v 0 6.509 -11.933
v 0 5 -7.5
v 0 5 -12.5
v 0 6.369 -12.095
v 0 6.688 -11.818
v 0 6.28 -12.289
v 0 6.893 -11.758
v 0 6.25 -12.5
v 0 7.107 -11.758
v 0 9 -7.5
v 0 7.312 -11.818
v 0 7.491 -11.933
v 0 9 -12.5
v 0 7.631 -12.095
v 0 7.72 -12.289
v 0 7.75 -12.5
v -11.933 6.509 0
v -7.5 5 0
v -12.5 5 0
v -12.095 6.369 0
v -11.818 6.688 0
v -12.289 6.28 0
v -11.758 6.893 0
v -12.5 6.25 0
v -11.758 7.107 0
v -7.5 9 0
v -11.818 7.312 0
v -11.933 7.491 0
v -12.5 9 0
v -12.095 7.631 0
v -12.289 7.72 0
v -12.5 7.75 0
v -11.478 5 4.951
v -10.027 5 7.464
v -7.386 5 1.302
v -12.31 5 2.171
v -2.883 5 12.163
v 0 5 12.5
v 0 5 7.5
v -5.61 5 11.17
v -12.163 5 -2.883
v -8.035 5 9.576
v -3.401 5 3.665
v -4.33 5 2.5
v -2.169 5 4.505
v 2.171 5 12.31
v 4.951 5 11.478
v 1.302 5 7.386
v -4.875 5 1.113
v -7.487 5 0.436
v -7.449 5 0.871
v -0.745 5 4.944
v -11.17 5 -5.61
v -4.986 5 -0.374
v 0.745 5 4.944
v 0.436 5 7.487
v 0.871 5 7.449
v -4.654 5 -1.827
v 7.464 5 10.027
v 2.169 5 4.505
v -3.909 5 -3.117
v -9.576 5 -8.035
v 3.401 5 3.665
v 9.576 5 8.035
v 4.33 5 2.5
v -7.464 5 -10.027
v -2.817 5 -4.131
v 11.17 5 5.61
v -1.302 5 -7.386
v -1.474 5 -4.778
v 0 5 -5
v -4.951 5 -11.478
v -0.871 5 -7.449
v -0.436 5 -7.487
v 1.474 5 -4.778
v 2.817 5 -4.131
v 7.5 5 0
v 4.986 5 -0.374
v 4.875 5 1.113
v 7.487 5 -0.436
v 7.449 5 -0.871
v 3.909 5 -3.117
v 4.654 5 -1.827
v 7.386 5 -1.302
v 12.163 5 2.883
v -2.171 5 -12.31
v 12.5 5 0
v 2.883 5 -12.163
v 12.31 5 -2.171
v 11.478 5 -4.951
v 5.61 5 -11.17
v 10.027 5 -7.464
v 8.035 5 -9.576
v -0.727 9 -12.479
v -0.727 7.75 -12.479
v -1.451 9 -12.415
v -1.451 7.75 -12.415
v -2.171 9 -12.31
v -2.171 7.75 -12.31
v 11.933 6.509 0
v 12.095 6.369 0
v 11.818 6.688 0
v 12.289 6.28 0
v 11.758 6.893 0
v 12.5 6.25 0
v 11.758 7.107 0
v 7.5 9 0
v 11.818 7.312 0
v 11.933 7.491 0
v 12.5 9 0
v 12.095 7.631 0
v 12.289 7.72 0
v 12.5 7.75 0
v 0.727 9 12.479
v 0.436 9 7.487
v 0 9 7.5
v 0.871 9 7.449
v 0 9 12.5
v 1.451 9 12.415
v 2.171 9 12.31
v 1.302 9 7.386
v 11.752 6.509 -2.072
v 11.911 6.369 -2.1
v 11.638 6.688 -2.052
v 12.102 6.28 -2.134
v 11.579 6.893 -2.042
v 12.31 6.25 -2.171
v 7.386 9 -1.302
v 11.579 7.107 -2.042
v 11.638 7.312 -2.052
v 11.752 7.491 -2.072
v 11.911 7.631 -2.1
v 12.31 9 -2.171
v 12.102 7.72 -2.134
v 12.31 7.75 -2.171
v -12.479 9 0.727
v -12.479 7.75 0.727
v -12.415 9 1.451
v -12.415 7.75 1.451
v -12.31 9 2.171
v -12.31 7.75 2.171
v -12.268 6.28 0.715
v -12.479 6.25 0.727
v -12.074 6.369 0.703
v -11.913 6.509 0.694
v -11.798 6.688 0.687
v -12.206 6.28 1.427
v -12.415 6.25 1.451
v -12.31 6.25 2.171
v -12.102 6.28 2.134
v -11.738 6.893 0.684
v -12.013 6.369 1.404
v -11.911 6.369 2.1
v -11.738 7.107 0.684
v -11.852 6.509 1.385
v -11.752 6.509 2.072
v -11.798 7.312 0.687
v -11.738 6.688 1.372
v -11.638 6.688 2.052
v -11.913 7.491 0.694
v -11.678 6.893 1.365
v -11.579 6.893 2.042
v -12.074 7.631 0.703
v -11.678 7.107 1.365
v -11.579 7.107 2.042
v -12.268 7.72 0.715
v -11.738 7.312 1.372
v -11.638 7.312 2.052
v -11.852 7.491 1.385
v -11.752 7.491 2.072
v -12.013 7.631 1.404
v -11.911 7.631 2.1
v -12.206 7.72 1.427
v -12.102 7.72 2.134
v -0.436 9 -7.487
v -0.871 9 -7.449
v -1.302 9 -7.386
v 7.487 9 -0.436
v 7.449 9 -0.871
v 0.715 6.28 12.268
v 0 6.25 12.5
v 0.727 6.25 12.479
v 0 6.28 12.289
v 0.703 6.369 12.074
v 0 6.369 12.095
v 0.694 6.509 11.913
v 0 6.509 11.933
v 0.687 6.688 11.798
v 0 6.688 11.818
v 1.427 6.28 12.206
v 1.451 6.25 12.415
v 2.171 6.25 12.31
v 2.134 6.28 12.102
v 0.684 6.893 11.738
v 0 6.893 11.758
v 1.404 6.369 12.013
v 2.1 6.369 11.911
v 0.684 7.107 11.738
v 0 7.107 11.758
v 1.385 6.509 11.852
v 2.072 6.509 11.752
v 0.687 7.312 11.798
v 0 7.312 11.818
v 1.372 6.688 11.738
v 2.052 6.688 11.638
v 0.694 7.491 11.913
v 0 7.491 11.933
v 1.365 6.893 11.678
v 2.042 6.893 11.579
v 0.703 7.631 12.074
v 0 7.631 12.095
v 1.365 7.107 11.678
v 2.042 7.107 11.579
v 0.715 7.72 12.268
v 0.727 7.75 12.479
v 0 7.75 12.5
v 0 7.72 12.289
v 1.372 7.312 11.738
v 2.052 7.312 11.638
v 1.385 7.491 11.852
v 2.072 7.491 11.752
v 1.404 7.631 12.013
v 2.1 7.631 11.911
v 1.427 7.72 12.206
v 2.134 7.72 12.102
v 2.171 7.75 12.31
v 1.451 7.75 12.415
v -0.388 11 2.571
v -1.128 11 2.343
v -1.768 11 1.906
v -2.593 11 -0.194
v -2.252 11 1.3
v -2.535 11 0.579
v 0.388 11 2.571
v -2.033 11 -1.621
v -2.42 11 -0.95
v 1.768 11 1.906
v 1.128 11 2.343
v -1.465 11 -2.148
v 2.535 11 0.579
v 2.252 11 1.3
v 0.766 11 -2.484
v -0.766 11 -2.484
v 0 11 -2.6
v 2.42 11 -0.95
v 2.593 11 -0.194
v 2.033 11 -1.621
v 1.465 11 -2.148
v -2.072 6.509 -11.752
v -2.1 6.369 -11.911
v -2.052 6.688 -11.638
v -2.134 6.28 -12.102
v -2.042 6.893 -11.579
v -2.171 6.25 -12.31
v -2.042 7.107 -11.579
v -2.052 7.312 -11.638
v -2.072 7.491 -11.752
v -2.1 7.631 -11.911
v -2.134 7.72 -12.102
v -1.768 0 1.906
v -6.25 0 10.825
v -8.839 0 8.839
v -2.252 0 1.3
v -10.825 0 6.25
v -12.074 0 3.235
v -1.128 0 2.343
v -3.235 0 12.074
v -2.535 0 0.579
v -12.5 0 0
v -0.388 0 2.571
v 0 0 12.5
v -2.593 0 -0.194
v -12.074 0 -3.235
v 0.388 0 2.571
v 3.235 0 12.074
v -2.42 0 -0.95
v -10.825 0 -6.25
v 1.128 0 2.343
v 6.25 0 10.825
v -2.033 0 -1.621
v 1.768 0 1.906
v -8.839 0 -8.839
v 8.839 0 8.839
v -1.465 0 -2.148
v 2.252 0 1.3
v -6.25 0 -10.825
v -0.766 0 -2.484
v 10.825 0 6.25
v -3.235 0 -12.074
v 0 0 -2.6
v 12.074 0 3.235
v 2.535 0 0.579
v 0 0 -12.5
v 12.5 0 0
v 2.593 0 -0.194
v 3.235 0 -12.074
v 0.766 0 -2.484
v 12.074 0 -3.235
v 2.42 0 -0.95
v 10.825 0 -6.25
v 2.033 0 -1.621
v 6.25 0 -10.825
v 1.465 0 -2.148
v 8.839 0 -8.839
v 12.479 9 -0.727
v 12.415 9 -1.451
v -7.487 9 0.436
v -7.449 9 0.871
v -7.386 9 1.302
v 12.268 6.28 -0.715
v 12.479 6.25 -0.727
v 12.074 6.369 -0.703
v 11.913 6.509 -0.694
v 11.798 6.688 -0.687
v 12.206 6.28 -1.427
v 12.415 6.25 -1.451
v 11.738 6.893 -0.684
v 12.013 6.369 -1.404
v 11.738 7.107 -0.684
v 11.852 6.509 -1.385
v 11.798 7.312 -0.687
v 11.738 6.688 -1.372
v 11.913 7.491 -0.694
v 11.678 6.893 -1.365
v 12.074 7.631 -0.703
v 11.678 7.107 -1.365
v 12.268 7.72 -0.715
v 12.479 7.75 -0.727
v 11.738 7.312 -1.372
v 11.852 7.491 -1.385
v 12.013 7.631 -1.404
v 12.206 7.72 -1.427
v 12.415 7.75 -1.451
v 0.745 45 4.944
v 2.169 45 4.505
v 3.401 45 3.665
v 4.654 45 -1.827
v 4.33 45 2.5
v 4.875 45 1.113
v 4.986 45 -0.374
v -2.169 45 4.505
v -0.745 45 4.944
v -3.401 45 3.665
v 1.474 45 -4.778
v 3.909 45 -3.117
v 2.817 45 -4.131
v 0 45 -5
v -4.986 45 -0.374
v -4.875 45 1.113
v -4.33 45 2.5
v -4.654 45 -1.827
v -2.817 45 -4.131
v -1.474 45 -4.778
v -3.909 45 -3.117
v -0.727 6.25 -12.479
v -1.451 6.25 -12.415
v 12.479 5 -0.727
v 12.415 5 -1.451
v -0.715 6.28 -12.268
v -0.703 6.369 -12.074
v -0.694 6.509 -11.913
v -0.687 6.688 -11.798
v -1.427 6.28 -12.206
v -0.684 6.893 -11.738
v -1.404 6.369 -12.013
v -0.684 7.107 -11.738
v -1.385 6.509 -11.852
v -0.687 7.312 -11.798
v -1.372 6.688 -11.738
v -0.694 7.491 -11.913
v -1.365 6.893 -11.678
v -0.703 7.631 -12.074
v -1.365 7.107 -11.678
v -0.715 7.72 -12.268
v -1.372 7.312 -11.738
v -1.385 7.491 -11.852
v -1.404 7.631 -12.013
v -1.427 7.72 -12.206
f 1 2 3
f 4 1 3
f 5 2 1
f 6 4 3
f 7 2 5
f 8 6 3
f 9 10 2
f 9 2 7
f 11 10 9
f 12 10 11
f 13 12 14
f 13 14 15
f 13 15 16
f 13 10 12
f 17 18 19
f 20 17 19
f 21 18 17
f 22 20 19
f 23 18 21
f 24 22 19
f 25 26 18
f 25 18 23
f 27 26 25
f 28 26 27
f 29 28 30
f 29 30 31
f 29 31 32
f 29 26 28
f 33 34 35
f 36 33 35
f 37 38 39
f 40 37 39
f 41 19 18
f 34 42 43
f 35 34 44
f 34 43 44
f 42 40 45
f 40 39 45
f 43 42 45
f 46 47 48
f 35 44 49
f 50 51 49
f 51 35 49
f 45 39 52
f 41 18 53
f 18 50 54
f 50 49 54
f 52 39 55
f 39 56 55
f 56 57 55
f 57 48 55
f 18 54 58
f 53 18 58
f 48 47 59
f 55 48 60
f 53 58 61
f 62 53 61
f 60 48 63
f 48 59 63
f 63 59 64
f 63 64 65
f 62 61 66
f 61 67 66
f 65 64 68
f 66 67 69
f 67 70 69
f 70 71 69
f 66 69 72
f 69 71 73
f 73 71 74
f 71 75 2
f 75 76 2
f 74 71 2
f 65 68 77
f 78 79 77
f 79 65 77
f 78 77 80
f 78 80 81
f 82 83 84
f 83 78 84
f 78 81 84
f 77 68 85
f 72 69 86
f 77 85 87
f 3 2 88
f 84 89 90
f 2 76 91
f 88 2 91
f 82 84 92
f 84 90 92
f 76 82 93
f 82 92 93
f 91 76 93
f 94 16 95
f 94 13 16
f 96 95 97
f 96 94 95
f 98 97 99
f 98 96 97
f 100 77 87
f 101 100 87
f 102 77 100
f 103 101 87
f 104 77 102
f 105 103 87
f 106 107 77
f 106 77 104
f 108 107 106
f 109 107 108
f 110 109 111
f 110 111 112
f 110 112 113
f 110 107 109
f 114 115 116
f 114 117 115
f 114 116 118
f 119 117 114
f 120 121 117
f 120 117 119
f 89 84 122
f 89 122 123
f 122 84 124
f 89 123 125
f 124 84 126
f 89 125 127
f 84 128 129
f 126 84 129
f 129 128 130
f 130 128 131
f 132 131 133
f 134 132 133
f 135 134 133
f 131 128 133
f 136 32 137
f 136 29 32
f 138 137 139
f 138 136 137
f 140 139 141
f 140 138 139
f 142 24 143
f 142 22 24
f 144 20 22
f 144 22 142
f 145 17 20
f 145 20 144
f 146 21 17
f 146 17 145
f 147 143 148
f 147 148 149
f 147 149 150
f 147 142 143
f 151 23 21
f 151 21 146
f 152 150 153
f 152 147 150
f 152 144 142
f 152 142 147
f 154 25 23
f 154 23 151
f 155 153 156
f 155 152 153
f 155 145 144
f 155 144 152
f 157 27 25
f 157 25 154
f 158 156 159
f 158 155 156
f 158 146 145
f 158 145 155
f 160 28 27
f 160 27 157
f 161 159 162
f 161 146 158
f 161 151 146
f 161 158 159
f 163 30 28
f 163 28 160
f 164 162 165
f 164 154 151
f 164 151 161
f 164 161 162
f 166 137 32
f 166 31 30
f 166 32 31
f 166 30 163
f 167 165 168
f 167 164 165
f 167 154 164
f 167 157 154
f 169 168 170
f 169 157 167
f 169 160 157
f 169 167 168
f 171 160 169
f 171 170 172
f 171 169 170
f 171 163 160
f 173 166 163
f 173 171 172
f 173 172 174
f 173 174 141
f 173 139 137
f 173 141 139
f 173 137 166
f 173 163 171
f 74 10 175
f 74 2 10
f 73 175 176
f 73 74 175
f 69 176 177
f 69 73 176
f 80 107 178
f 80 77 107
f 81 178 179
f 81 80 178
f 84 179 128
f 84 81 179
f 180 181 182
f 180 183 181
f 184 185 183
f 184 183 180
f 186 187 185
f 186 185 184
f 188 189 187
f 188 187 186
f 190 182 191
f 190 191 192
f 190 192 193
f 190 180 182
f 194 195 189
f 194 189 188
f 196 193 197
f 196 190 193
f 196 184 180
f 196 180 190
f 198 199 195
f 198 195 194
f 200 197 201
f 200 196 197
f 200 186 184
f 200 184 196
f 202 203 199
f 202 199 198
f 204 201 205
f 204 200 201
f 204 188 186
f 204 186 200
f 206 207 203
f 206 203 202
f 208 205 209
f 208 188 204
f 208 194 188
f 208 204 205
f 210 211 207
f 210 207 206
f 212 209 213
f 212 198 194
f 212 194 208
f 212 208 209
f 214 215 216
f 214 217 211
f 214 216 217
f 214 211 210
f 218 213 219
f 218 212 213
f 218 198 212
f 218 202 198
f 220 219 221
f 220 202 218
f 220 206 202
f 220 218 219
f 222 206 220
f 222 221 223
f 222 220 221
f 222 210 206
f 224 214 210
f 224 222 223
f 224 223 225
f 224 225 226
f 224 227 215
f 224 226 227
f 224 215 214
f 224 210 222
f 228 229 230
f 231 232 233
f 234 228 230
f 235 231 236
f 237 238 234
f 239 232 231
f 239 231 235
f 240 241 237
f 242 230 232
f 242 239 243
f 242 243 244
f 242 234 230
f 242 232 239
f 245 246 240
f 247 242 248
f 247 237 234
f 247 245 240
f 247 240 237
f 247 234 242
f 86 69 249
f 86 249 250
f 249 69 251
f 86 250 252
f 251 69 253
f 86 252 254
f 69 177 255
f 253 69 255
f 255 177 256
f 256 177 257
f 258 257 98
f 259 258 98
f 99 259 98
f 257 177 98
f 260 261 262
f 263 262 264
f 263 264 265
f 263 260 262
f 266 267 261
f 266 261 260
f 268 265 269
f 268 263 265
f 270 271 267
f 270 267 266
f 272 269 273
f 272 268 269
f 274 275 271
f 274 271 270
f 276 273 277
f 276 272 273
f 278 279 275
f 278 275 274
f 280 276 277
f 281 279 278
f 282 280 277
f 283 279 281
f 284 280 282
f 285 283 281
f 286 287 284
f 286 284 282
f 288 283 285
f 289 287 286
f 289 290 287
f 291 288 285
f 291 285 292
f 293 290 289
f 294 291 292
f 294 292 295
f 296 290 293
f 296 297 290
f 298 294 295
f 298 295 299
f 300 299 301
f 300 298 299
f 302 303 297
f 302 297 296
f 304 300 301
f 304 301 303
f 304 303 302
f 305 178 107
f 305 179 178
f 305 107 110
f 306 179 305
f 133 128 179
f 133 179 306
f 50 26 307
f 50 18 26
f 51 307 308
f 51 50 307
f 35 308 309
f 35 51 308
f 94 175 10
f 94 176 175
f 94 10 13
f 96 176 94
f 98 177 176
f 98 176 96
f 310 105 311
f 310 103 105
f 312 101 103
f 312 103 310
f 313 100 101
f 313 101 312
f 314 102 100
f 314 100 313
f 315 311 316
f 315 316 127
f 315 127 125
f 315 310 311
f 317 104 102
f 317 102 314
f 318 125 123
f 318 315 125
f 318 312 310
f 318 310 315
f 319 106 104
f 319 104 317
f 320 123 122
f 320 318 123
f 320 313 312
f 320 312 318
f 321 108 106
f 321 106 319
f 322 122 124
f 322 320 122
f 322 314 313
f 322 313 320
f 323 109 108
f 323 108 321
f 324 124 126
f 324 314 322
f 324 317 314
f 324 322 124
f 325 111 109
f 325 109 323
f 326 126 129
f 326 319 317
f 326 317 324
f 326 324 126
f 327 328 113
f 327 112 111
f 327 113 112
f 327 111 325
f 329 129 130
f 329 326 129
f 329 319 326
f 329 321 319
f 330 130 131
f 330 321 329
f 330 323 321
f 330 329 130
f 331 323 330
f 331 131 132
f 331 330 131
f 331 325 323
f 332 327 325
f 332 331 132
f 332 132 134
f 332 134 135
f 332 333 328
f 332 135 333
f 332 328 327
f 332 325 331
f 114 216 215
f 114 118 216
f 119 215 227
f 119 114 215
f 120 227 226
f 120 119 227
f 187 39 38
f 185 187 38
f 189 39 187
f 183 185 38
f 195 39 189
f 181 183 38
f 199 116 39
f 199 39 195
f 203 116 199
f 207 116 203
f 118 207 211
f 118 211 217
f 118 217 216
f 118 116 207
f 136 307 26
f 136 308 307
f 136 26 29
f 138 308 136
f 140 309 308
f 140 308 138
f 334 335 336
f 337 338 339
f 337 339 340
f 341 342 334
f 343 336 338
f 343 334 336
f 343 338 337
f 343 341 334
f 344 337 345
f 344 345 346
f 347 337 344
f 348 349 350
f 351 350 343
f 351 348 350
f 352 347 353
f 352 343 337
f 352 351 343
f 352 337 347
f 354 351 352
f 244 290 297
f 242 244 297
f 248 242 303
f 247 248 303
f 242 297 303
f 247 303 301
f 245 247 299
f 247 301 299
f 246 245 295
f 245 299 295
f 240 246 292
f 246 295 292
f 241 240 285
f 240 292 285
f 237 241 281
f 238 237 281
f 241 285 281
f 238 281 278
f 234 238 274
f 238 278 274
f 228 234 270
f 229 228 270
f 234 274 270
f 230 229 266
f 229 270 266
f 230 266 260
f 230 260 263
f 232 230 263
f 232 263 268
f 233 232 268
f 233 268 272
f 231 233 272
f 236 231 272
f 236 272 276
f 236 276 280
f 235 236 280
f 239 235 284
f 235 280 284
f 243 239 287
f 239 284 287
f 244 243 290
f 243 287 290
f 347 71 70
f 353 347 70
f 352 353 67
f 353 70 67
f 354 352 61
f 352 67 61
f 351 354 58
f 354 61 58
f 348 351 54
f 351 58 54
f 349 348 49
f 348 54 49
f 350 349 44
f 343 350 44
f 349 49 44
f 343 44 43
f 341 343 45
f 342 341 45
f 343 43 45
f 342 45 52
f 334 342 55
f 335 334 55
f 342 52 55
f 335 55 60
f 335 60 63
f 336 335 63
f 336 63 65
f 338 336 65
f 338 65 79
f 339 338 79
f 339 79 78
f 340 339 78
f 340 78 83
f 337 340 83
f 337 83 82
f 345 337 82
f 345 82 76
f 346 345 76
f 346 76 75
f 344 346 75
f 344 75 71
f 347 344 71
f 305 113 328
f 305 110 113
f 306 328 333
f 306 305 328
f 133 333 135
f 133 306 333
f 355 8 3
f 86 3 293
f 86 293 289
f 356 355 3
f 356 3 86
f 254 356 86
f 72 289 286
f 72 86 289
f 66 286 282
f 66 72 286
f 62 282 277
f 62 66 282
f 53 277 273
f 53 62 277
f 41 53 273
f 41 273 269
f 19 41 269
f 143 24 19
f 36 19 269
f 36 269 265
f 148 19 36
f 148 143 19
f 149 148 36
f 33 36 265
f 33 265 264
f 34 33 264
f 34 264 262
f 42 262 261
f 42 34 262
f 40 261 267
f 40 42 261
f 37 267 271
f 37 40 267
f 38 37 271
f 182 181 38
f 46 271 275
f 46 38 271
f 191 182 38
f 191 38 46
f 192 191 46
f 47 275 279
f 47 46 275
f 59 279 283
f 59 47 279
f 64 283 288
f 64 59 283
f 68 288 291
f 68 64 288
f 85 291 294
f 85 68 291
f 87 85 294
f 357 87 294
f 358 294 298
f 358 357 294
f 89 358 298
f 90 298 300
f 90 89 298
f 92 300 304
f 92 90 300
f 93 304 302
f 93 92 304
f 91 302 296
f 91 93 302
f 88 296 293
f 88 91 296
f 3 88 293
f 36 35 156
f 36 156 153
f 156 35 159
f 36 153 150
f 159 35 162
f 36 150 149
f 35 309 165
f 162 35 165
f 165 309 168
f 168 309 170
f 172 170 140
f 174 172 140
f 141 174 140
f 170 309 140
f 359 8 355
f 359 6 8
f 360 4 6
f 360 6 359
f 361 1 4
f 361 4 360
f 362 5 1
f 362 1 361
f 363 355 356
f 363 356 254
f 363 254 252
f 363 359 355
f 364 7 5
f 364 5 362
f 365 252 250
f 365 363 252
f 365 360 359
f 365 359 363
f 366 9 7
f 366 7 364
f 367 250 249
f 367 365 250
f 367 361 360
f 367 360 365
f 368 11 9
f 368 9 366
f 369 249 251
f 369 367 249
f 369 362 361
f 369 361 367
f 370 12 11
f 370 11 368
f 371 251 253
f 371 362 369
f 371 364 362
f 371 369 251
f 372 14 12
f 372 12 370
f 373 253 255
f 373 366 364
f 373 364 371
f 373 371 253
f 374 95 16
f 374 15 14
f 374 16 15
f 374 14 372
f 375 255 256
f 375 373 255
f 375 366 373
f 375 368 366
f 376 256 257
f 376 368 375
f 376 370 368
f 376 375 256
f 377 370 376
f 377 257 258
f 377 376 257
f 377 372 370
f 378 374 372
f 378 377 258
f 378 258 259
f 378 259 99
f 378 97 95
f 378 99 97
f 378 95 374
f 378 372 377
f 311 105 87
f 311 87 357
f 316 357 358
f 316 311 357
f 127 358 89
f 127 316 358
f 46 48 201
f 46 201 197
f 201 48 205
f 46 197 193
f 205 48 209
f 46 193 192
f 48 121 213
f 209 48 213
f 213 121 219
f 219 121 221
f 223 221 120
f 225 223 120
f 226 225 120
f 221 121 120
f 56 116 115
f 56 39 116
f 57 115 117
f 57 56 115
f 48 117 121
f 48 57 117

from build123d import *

# Parameters (mm, degrees)
SKETCH1_R                  = 5
SHAFT_DEPTH                = 45
SKETCH3_R                  = 12.5
DATUM_DEPTH                = 5
WIRE_SUPPORT_ANGLE         = 10
WIRE_SUPPORT_PATTERN_COUNT = 4
SKETCH6_R                  = 2.6
HOLE_DEPTH                 = 11


with BuildPart() as part:
    # Sketch1 → Shaft (new body)
    with BuildSketch(Plane(origin=(0, 0, 0), x_dir=(1, 0, 0), z_dir=(0, 1, 0))):
        with Locations(Location((0, 0, 0), (0, 0, 90))):
            Circle(SKETCH1_R)
    extrude(amount=SHAFT_DEPTH)

    # Sketch3 → Datum (add)
    with BuildSketch(Plane(origin=(0, 0, 0), x_dir=(-1, 0, 0), z_dir=(0, -1, 0))):
        with Locations(Location((0, 0, 0), (0, 0, 90))):
            Circle(SKETCH3_R)
    extrude(amount=-DATUM_DEPTH)

    # Sketch4 → Wire Support (revolve)
    with BuildSketch(Plane(origin=(0, 0, 0), x_dir=(0, 0, -1), z_dir=(1, 0, 0))):
        with BuildLine():
            Line((7.5, 5), (12.5, 5))
            Line((12.5, 5), (12.5, 6.25))
            ThreePointArc((12.5, 6.25), (11.75, 7), (12.5, 7.75))
            Line((12.5, 7.75), (12.5, 9))
            Line((12.5, 9), (7.5, 9))
            Line((7.5, 9), (7.5, 5))
        make_face()
    wire_support = revolve(axis=Axis((0, 45, 0), (0, 1, 0)), revolution_arc=WIRE_SUPPORT_ANGLE)

    # Wire Support Pattern: Wire Support ×4 about axis
    wire_support_pattern_axis = Axis((0, 45, 0), (0, 1, 0))
    for i in range(1, WIRE_SUPPORT_PATTERN_COUNT):
        add(wire_support.rotate(wire_support_pattern_axis, i * 360 / WIRE_SUPPORT_PATTERN_COUNT))

    # Sketch6 → Hole (cut)
    with BuildSketch(Plane.XZ):
        with Locations(Location((0, 0, 0), (0, 0, 270))):
            Circle(SKETCH6_R)
    extrude(amount=-HOLE_DEPTH, mode=Mode.SUBTRACT)


solid = part.part
